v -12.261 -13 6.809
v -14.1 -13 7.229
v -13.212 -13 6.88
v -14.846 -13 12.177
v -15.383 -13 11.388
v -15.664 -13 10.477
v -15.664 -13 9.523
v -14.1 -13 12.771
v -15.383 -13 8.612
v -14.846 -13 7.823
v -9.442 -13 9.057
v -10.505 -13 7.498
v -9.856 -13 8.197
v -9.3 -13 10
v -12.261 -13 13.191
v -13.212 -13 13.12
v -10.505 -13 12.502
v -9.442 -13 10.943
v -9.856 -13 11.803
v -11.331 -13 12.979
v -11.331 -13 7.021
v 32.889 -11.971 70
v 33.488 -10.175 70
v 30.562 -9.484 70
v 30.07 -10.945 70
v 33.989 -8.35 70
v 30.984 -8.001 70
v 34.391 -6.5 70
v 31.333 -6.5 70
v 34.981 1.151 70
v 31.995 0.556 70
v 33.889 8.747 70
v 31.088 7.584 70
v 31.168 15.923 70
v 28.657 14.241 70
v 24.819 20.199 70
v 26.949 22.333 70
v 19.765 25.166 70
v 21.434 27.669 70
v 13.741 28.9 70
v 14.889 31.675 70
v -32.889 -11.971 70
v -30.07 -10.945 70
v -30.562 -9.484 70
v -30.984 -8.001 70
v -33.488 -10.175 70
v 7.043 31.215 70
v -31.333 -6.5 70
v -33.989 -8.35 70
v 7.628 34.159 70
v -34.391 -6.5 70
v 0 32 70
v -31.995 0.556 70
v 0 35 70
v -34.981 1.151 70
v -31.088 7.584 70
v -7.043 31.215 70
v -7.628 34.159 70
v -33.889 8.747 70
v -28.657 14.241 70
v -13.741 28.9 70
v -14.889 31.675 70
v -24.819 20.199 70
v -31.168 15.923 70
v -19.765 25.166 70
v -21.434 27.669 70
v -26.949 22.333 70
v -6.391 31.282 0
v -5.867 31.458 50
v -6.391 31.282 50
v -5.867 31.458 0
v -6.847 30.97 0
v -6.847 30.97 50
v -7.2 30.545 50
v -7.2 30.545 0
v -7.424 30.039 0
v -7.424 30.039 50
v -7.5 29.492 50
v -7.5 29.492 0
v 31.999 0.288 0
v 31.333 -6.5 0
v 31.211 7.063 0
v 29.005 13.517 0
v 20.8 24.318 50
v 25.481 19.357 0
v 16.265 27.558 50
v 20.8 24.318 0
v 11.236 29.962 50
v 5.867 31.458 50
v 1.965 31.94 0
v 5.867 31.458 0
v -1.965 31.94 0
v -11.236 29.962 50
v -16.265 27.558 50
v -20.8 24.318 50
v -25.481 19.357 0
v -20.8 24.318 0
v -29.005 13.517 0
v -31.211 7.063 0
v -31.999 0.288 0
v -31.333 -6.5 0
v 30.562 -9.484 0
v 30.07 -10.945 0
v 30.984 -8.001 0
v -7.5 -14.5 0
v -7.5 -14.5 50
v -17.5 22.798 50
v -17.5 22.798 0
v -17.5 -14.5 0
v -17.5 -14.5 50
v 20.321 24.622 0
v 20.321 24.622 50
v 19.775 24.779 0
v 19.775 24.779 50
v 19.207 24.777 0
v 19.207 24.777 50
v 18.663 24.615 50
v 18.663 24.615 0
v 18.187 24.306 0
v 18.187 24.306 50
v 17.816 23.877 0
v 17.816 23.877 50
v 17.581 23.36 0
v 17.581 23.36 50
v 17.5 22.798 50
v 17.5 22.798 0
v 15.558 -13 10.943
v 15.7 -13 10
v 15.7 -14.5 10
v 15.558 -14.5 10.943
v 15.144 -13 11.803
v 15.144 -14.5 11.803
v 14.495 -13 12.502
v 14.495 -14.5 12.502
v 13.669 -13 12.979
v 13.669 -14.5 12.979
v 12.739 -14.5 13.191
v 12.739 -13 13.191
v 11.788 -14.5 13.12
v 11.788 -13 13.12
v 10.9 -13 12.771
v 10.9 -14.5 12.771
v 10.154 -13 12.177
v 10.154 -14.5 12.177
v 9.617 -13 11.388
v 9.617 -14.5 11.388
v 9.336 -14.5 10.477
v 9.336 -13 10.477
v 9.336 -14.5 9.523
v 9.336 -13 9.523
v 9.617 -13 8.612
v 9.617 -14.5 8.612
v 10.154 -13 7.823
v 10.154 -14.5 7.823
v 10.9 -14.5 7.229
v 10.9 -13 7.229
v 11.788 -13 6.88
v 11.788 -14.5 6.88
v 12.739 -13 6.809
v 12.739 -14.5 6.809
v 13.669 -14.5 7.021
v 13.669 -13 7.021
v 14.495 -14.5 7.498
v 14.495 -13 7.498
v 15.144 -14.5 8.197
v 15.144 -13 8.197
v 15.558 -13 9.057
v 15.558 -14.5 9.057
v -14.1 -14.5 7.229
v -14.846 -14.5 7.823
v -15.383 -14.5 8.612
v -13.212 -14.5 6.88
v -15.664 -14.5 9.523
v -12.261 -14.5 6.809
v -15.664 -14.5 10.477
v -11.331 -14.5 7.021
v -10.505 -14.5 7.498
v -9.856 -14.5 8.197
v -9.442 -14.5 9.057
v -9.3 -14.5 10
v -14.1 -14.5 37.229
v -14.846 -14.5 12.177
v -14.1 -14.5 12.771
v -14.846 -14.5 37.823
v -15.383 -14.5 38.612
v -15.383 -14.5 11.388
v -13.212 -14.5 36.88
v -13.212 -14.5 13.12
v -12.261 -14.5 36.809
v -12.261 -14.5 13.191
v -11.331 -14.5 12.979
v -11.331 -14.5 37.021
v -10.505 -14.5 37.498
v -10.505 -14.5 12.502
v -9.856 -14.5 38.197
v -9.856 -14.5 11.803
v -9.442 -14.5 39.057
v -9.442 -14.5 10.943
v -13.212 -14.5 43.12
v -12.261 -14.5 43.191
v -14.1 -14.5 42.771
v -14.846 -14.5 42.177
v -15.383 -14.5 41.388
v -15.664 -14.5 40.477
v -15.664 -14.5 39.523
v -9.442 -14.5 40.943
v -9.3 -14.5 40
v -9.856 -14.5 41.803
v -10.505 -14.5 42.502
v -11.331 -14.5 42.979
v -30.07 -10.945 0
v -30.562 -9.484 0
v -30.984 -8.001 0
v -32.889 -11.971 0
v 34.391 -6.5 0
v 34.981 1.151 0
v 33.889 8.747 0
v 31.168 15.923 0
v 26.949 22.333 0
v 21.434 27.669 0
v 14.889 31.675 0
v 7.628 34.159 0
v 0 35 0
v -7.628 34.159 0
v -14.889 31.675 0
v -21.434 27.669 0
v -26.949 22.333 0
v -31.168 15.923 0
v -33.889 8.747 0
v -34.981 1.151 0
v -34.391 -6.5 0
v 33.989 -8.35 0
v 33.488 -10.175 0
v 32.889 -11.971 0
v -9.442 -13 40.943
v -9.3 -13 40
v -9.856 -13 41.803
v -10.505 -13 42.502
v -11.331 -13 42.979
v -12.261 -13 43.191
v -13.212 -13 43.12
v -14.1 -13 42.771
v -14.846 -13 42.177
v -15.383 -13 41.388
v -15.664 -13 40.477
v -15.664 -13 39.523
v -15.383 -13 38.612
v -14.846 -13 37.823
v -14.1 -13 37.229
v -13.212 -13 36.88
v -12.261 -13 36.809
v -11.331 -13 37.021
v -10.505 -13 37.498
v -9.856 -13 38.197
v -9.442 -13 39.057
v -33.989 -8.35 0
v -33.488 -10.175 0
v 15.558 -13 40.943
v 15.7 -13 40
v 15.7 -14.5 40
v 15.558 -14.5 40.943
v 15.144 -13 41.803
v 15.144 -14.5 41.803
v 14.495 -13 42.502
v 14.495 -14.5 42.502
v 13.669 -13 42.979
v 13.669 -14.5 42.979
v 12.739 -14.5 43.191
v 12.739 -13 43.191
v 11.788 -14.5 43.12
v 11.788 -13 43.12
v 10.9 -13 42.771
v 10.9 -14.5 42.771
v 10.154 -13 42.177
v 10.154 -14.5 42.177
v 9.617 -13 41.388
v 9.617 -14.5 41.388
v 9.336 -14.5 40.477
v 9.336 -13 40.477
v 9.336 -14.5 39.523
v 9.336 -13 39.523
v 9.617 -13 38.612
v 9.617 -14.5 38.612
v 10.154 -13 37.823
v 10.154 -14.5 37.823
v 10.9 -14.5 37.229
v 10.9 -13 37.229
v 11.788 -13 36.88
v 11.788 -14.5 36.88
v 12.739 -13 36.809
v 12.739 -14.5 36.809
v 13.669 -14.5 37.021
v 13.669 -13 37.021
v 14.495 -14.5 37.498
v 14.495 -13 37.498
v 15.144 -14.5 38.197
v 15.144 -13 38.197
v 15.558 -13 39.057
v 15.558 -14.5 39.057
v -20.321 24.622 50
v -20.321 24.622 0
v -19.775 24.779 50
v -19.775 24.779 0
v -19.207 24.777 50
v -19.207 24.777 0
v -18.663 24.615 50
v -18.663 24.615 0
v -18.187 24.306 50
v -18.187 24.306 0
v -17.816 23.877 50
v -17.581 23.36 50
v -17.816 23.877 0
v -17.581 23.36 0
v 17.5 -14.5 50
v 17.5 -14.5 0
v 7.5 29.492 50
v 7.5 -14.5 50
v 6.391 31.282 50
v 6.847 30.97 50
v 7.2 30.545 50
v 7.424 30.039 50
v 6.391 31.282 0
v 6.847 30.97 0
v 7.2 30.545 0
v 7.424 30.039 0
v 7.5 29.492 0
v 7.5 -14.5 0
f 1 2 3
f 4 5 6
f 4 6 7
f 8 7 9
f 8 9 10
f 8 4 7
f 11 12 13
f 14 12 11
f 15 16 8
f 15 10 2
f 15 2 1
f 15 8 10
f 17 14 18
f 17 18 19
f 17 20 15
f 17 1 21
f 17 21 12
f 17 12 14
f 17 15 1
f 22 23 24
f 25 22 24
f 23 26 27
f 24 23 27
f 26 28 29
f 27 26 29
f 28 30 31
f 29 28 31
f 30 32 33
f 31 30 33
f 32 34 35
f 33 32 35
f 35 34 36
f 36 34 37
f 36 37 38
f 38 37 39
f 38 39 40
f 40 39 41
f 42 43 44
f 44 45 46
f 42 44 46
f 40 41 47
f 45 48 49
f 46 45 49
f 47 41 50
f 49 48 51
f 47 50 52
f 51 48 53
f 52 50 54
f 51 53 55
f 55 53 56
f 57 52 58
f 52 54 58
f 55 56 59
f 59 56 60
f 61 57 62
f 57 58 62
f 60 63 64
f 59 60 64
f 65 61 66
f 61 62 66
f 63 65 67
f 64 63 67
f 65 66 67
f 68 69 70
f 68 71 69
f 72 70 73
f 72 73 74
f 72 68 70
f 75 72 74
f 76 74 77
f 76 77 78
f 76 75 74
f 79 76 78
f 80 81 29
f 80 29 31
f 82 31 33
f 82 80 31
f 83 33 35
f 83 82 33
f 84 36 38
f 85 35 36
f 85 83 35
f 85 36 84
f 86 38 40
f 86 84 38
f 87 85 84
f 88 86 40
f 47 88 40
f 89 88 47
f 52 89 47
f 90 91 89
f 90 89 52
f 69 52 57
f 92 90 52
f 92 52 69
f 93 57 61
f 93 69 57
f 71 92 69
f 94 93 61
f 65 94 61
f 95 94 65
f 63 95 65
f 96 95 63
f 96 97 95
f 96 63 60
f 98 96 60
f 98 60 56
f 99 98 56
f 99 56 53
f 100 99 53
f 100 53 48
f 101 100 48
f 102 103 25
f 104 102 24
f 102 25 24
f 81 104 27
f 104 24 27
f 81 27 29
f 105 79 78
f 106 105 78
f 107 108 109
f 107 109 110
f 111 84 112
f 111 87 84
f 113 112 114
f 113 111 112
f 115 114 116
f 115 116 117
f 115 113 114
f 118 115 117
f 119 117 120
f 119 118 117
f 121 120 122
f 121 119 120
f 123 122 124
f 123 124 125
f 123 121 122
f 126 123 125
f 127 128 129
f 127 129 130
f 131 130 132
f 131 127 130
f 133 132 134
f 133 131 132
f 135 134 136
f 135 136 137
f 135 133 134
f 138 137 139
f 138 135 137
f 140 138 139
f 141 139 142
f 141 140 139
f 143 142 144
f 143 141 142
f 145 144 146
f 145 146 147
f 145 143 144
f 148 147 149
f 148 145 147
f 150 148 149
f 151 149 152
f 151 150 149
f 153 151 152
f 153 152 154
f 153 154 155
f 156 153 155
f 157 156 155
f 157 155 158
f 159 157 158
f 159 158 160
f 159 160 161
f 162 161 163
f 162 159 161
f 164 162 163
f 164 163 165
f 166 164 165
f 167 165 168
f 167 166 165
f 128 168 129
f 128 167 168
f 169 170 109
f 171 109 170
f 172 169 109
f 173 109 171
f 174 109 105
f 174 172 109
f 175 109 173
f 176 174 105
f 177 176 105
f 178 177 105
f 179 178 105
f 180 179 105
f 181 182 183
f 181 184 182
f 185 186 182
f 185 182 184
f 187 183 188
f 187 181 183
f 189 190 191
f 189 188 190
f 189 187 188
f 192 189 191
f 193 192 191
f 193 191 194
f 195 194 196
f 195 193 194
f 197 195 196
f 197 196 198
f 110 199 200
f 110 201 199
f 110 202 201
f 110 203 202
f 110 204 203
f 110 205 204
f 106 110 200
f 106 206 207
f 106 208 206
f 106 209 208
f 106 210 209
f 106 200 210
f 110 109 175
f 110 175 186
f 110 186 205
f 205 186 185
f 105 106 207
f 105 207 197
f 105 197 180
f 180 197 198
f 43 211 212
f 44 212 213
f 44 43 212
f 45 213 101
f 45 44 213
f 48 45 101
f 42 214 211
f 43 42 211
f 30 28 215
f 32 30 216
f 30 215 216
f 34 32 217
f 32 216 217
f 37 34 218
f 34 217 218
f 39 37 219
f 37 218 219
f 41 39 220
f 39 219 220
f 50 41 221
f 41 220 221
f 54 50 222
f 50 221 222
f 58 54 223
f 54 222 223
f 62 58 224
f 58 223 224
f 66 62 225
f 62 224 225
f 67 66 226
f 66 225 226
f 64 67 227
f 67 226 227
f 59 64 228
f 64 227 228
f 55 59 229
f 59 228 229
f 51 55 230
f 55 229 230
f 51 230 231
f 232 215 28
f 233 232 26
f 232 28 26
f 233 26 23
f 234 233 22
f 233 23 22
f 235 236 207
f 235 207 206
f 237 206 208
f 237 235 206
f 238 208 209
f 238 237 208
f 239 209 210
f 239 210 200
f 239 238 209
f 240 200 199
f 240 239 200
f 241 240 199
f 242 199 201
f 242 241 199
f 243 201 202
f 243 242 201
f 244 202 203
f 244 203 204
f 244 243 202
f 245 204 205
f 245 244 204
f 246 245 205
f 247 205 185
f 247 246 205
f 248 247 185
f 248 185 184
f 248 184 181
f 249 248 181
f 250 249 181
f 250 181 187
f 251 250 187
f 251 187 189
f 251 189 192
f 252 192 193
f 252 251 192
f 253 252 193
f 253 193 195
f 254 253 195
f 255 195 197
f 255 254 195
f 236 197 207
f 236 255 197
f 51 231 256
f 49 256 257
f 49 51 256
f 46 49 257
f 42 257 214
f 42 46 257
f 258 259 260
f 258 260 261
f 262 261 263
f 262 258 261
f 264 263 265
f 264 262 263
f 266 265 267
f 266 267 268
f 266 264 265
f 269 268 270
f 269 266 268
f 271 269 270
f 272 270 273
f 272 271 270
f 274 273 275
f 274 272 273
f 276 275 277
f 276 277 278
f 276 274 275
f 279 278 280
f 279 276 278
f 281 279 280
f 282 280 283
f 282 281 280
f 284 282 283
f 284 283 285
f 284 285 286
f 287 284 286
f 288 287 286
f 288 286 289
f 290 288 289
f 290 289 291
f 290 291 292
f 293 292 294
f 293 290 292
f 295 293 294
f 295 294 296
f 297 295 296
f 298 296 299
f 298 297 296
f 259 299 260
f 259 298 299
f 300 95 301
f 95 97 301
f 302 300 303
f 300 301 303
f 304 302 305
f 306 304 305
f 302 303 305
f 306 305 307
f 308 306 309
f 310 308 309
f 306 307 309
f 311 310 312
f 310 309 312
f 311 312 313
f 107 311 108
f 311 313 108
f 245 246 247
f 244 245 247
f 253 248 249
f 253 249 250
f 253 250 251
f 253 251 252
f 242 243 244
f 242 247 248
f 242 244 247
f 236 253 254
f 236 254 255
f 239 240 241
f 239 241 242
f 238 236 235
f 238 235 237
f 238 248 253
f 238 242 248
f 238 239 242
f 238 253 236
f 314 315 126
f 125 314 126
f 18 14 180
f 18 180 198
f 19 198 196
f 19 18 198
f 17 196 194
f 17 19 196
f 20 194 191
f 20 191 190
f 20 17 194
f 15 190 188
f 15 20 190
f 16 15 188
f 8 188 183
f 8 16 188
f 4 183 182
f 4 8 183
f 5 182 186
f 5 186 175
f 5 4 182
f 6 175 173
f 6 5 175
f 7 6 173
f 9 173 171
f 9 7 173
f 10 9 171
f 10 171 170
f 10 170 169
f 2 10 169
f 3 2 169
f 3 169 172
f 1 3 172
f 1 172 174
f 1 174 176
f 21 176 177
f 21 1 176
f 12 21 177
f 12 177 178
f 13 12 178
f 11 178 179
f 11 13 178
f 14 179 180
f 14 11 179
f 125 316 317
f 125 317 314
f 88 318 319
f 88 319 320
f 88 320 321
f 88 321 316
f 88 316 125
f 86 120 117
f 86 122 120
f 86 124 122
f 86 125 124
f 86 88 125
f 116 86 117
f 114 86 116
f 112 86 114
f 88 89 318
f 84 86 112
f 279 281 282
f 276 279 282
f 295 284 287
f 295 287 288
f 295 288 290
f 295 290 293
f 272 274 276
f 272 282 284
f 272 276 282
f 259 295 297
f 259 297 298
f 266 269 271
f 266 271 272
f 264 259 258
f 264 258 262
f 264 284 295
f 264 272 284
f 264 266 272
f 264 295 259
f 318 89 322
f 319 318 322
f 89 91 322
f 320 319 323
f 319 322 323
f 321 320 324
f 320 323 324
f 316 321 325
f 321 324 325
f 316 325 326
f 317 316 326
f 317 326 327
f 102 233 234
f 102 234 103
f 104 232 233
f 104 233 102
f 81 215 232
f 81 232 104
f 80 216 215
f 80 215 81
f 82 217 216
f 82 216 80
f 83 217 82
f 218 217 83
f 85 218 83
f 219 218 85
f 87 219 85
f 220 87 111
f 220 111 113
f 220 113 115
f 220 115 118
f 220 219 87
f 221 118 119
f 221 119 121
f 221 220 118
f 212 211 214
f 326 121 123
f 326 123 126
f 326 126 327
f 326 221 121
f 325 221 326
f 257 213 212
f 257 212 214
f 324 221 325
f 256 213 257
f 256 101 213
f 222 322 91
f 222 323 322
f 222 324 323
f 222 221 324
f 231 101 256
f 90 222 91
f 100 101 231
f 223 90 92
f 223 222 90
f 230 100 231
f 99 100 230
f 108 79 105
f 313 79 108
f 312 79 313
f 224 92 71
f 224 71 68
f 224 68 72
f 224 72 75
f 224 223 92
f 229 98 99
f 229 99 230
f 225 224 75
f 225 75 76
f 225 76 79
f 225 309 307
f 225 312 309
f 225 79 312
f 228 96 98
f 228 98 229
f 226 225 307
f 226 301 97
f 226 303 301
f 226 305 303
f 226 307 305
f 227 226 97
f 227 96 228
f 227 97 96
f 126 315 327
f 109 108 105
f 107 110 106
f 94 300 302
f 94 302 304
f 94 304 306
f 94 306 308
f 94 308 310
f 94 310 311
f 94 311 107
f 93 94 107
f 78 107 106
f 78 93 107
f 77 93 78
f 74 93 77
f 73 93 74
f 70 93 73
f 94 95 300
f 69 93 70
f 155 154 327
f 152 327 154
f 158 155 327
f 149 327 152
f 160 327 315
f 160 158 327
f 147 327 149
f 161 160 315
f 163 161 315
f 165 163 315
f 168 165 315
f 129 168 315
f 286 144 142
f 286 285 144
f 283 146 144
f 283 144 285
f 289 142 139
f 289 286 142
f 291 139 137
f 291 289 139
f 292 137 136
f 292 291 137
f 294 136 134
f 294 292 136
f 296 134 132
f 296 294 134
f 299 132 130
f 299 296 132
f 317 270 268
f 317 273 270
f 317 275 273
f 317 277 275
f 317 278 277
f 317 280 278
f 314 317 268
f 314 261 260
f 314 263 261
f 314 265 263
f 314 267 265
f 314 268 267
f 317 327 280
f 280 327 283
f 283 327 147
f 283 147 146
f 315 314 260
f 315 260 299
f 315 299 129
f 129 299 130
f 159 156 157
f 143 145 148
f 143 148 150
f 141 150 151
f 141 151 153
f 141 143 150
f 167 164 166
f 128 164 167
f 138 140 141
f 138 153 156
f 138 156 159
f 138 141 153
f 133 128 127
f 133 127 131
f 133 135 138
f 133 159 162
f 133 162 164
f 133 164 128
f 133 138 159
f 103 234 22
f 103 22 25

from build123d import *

# Parameters (mm, degrees)
ESQUISSE1_R                  = 35
ESQUISSE1_R_2                = 32
BOSS_EXTRU_1_DEPTH           = 70
BOSS_EXTRU_2_DEPTH           = 70
ESQUISSE3_R                  = 3.2
ENL_V_MAT_EXTRU_1_DEPTH      = 20
ENL_V_MAT_EXTRU_1_DEPTH_BACK = 20
ESQUISSE5_W                  = 100
ESQUISSE5_H                  = 50
ENL_V_MAT_EXTRU_3_DEPTH      = 71
ESQUISSE7_W                  = 10
ESQUISSE7_H                  = 70
ESQUISSE7_R                  = 3.2
BOSS_EXTRU_3_DEPTH           = 8
BOSS_EXTRU_5_DEPTH           = 70
ESQUISSE10_R                 = 32
ENL_V_MAT_EXTRU_4_DEPTH      = 20
CONG_2_R                     = 2
BOSS_EXTRU_6_START           = -1.5
ESQUISSE11_R                 = 3.2
BOSS_EXTRU_6_DEPTH           = 33


with BuildPart() as part:
    # Esquisse1 → Boss.-Extru.1 (new body)
    with BuildSketch(Plane.XY):
        Circle(ESQUISSE1_R)
        Circle(ESQUISSE1_R_2, mode=Mode.SUBTRACT)
    extrude(amount=BOSS_EXTRU_1_DEPTH)

    # Esquisse2 → Boss.-Extru.2 (add)
    with BuildSketch(Plane.XY.offset(70)):
        with BuildLine():
            Line((-7.5, 31.108680461), (-7.5, -31.108680461))
            ThreePointArc((-7.5, -31.108680461), (-12.685066047, -29.378378093), (-17.5, -26.790856649))
            Line((-17.5, -26.790856649), (-17.5, 26.790856649))
            ThreePointArc((-17.5, 26.790856649), (-12.685066047, 29.378378093), (-7.5, 31.108680461))
        make_face()
        with BuildLine():
            Line((17.5, -26.790856649), (17.5, 26.790856649))
            ThreePointArc((17.5, 26.790856649), (12.685066047, 29.378378093), (7.5, 31.108680461))
            Line((7.5, 31.108680461), (7.5, -31.108680461))
            ThreePointArc((7.5, -31.108680461), (12.685066047, -29.378378093), (17.5, -26.790856649))
        make_face()
    extrude(amount=-BOSS_EXTRU_2_DEPTH)

    # Esquisse3 → Enlèv. mat.-Extru.1 (cut, two sides)
    with BuildSketch(Plane(origin=(0, 0, 0), x_dir=(1, 0, 0), z_dir=(0, 1, 0))) as enl_v_mat_extru_1_sk:
        with Locations((-12.5, -10)):
            Circle(ESQUISSE3_R)
        with Locations((-12.5, -40)):
            Circle(ESQUISSE3_R)
        with Locations((12.5, -40)):
            Circle(ESQUISSE3_R)
        with Locations((12.5, -10)):
            Circle(ESQUISSE3_R)
    extrude(amount=ENL_V_MAT_EXTRU_1_DEPTH, mode=Mode.SUBTRACT)
    extrude(enl_v_mat_extru_1_sk.sketch, amount=-ENL_V_MAT_EXTRU_1_DEPTH_BACK, mode=Mode.SUBTRACT)

    # Esquisse5 → Enlèv. mat.-Extru.3 (cut, through all)
    with BuildSketch(Plane.XY.offset(70)):
        with Locations((0, -31.5)):
            Rectangle(ESQUISSE5_W, ESQUISSE5_H)
    extrude(amount=-ENL_V_MAT_EXTRU_3_DEPTH, mode=Mode.SUBTRACT)

    # Esquisse7 → Boss.-Extru.3 (add)
    with BuildSketch(Plane.XZ.offset(6.5)):
        with Locations((-12.5, 35)):
            Rectangle(ESQUISSE7_W, ESQUISSE7_H)
        with Locations((-12.5, 40)):
            Circle(ESQUISSE7_R, mode=Mode.SUBTRACT)
        with Locations((-12.5, 10)):
            Circle(ESQUISSE7_R, mode=Mode.SUBTRACT)
        with Locations((12.5, 35)):
            Rectangle(ESQUISSE7_W, ESQUISSE7_H)
        with Locations((12.5, 40)):
            Circle(ESQUISSE7_R, mode=Mode.SUBTRACT)
        with Locations((12.5, 10)):
            Circle(ESQUISSE7_R, mode=Mode.SUBTRACT)
    extrude(amount=BOSS_EXTRU_3_DEPTH)

    # Esquisse8 → Boss.-Extru.5 (add)
    with BuildSketch(Plane.XY.offset(70)):
        with BuildLine():
            Line((32.889241728, -11.970705016), (30.070163865, -10.944644586))
            ThreePointArc((30.070163865, -10.944644586), (30.781853005, -8.745142969), (31.332890068, -6.5))
            Line((31.332890068, -6.5), (34.391132578, -6.5))
            ThreePointArc((34.391132578, -6.5), (33.751212497, -9.265832665), (32.889241728, -11.970705016))
        make_face()
        with BuildLine():
            Line((-32.889241728, -11.970705016), (-30.070163865, -10.944644586))
            ThreePointArc((-30.070163865, -10.944644586), (-30.781853005, -8.745142969), (-31.332890068, -6.5))
            Line((-31.332890068, -6.5), (-34.391132578, -6.5))
            ThreePointArc((-34.391132578, -6.5), (-33.751212497, -9.265832665), (-32.889241728, -11.970705016))
        make_face()
    extrude(amount=-BOSS_EXTRU_5_DEPTH)

    # Esquisse10 → Enlèv. mat.-Extru.4 (cut)
    with BuildSketch(Plane.XY.offset(70)):
        Circle(ESQUISSE10_R)
    extrude(amount=-ENL_V_MAT_EXTRU_4_DEPTH, mode=Mode.SUBTRACT)

    # Congé2
    cong_2_edges = [part.edges().sort_by_distance(p)[0] for p in [
        (-17.5, 26.790856649, 25),
        (-7.5, 31.108680461, 25),
        (7.5, 31.108680461, 25),
        (17.5, 26.790856649, 25),
    ]]
    fillet(cong_2_edges, radius=CONG_2_R)

    # Esquisse11 → Boss.-Extru.6 (add)
    with BuildSketch(Plane.XZ.offset(14.5).offset(BOSS_EXTRU_6_START)):
        with Locations((12.5, 10)):
            Circle(ESQUISSE11_R)
        with Locations((12.5, 40)):
            Circle(ESQUISSE11_R)
        with Locations((-12.5, 40)):
            Circle(ESQUISSE11_R)
        with Locations((-12.5, 10)):
            Circle(ESQUISSE11_R)
    extrude(amount=-BOSS_EXTRU_6_DEPTH)


solid = part.part
